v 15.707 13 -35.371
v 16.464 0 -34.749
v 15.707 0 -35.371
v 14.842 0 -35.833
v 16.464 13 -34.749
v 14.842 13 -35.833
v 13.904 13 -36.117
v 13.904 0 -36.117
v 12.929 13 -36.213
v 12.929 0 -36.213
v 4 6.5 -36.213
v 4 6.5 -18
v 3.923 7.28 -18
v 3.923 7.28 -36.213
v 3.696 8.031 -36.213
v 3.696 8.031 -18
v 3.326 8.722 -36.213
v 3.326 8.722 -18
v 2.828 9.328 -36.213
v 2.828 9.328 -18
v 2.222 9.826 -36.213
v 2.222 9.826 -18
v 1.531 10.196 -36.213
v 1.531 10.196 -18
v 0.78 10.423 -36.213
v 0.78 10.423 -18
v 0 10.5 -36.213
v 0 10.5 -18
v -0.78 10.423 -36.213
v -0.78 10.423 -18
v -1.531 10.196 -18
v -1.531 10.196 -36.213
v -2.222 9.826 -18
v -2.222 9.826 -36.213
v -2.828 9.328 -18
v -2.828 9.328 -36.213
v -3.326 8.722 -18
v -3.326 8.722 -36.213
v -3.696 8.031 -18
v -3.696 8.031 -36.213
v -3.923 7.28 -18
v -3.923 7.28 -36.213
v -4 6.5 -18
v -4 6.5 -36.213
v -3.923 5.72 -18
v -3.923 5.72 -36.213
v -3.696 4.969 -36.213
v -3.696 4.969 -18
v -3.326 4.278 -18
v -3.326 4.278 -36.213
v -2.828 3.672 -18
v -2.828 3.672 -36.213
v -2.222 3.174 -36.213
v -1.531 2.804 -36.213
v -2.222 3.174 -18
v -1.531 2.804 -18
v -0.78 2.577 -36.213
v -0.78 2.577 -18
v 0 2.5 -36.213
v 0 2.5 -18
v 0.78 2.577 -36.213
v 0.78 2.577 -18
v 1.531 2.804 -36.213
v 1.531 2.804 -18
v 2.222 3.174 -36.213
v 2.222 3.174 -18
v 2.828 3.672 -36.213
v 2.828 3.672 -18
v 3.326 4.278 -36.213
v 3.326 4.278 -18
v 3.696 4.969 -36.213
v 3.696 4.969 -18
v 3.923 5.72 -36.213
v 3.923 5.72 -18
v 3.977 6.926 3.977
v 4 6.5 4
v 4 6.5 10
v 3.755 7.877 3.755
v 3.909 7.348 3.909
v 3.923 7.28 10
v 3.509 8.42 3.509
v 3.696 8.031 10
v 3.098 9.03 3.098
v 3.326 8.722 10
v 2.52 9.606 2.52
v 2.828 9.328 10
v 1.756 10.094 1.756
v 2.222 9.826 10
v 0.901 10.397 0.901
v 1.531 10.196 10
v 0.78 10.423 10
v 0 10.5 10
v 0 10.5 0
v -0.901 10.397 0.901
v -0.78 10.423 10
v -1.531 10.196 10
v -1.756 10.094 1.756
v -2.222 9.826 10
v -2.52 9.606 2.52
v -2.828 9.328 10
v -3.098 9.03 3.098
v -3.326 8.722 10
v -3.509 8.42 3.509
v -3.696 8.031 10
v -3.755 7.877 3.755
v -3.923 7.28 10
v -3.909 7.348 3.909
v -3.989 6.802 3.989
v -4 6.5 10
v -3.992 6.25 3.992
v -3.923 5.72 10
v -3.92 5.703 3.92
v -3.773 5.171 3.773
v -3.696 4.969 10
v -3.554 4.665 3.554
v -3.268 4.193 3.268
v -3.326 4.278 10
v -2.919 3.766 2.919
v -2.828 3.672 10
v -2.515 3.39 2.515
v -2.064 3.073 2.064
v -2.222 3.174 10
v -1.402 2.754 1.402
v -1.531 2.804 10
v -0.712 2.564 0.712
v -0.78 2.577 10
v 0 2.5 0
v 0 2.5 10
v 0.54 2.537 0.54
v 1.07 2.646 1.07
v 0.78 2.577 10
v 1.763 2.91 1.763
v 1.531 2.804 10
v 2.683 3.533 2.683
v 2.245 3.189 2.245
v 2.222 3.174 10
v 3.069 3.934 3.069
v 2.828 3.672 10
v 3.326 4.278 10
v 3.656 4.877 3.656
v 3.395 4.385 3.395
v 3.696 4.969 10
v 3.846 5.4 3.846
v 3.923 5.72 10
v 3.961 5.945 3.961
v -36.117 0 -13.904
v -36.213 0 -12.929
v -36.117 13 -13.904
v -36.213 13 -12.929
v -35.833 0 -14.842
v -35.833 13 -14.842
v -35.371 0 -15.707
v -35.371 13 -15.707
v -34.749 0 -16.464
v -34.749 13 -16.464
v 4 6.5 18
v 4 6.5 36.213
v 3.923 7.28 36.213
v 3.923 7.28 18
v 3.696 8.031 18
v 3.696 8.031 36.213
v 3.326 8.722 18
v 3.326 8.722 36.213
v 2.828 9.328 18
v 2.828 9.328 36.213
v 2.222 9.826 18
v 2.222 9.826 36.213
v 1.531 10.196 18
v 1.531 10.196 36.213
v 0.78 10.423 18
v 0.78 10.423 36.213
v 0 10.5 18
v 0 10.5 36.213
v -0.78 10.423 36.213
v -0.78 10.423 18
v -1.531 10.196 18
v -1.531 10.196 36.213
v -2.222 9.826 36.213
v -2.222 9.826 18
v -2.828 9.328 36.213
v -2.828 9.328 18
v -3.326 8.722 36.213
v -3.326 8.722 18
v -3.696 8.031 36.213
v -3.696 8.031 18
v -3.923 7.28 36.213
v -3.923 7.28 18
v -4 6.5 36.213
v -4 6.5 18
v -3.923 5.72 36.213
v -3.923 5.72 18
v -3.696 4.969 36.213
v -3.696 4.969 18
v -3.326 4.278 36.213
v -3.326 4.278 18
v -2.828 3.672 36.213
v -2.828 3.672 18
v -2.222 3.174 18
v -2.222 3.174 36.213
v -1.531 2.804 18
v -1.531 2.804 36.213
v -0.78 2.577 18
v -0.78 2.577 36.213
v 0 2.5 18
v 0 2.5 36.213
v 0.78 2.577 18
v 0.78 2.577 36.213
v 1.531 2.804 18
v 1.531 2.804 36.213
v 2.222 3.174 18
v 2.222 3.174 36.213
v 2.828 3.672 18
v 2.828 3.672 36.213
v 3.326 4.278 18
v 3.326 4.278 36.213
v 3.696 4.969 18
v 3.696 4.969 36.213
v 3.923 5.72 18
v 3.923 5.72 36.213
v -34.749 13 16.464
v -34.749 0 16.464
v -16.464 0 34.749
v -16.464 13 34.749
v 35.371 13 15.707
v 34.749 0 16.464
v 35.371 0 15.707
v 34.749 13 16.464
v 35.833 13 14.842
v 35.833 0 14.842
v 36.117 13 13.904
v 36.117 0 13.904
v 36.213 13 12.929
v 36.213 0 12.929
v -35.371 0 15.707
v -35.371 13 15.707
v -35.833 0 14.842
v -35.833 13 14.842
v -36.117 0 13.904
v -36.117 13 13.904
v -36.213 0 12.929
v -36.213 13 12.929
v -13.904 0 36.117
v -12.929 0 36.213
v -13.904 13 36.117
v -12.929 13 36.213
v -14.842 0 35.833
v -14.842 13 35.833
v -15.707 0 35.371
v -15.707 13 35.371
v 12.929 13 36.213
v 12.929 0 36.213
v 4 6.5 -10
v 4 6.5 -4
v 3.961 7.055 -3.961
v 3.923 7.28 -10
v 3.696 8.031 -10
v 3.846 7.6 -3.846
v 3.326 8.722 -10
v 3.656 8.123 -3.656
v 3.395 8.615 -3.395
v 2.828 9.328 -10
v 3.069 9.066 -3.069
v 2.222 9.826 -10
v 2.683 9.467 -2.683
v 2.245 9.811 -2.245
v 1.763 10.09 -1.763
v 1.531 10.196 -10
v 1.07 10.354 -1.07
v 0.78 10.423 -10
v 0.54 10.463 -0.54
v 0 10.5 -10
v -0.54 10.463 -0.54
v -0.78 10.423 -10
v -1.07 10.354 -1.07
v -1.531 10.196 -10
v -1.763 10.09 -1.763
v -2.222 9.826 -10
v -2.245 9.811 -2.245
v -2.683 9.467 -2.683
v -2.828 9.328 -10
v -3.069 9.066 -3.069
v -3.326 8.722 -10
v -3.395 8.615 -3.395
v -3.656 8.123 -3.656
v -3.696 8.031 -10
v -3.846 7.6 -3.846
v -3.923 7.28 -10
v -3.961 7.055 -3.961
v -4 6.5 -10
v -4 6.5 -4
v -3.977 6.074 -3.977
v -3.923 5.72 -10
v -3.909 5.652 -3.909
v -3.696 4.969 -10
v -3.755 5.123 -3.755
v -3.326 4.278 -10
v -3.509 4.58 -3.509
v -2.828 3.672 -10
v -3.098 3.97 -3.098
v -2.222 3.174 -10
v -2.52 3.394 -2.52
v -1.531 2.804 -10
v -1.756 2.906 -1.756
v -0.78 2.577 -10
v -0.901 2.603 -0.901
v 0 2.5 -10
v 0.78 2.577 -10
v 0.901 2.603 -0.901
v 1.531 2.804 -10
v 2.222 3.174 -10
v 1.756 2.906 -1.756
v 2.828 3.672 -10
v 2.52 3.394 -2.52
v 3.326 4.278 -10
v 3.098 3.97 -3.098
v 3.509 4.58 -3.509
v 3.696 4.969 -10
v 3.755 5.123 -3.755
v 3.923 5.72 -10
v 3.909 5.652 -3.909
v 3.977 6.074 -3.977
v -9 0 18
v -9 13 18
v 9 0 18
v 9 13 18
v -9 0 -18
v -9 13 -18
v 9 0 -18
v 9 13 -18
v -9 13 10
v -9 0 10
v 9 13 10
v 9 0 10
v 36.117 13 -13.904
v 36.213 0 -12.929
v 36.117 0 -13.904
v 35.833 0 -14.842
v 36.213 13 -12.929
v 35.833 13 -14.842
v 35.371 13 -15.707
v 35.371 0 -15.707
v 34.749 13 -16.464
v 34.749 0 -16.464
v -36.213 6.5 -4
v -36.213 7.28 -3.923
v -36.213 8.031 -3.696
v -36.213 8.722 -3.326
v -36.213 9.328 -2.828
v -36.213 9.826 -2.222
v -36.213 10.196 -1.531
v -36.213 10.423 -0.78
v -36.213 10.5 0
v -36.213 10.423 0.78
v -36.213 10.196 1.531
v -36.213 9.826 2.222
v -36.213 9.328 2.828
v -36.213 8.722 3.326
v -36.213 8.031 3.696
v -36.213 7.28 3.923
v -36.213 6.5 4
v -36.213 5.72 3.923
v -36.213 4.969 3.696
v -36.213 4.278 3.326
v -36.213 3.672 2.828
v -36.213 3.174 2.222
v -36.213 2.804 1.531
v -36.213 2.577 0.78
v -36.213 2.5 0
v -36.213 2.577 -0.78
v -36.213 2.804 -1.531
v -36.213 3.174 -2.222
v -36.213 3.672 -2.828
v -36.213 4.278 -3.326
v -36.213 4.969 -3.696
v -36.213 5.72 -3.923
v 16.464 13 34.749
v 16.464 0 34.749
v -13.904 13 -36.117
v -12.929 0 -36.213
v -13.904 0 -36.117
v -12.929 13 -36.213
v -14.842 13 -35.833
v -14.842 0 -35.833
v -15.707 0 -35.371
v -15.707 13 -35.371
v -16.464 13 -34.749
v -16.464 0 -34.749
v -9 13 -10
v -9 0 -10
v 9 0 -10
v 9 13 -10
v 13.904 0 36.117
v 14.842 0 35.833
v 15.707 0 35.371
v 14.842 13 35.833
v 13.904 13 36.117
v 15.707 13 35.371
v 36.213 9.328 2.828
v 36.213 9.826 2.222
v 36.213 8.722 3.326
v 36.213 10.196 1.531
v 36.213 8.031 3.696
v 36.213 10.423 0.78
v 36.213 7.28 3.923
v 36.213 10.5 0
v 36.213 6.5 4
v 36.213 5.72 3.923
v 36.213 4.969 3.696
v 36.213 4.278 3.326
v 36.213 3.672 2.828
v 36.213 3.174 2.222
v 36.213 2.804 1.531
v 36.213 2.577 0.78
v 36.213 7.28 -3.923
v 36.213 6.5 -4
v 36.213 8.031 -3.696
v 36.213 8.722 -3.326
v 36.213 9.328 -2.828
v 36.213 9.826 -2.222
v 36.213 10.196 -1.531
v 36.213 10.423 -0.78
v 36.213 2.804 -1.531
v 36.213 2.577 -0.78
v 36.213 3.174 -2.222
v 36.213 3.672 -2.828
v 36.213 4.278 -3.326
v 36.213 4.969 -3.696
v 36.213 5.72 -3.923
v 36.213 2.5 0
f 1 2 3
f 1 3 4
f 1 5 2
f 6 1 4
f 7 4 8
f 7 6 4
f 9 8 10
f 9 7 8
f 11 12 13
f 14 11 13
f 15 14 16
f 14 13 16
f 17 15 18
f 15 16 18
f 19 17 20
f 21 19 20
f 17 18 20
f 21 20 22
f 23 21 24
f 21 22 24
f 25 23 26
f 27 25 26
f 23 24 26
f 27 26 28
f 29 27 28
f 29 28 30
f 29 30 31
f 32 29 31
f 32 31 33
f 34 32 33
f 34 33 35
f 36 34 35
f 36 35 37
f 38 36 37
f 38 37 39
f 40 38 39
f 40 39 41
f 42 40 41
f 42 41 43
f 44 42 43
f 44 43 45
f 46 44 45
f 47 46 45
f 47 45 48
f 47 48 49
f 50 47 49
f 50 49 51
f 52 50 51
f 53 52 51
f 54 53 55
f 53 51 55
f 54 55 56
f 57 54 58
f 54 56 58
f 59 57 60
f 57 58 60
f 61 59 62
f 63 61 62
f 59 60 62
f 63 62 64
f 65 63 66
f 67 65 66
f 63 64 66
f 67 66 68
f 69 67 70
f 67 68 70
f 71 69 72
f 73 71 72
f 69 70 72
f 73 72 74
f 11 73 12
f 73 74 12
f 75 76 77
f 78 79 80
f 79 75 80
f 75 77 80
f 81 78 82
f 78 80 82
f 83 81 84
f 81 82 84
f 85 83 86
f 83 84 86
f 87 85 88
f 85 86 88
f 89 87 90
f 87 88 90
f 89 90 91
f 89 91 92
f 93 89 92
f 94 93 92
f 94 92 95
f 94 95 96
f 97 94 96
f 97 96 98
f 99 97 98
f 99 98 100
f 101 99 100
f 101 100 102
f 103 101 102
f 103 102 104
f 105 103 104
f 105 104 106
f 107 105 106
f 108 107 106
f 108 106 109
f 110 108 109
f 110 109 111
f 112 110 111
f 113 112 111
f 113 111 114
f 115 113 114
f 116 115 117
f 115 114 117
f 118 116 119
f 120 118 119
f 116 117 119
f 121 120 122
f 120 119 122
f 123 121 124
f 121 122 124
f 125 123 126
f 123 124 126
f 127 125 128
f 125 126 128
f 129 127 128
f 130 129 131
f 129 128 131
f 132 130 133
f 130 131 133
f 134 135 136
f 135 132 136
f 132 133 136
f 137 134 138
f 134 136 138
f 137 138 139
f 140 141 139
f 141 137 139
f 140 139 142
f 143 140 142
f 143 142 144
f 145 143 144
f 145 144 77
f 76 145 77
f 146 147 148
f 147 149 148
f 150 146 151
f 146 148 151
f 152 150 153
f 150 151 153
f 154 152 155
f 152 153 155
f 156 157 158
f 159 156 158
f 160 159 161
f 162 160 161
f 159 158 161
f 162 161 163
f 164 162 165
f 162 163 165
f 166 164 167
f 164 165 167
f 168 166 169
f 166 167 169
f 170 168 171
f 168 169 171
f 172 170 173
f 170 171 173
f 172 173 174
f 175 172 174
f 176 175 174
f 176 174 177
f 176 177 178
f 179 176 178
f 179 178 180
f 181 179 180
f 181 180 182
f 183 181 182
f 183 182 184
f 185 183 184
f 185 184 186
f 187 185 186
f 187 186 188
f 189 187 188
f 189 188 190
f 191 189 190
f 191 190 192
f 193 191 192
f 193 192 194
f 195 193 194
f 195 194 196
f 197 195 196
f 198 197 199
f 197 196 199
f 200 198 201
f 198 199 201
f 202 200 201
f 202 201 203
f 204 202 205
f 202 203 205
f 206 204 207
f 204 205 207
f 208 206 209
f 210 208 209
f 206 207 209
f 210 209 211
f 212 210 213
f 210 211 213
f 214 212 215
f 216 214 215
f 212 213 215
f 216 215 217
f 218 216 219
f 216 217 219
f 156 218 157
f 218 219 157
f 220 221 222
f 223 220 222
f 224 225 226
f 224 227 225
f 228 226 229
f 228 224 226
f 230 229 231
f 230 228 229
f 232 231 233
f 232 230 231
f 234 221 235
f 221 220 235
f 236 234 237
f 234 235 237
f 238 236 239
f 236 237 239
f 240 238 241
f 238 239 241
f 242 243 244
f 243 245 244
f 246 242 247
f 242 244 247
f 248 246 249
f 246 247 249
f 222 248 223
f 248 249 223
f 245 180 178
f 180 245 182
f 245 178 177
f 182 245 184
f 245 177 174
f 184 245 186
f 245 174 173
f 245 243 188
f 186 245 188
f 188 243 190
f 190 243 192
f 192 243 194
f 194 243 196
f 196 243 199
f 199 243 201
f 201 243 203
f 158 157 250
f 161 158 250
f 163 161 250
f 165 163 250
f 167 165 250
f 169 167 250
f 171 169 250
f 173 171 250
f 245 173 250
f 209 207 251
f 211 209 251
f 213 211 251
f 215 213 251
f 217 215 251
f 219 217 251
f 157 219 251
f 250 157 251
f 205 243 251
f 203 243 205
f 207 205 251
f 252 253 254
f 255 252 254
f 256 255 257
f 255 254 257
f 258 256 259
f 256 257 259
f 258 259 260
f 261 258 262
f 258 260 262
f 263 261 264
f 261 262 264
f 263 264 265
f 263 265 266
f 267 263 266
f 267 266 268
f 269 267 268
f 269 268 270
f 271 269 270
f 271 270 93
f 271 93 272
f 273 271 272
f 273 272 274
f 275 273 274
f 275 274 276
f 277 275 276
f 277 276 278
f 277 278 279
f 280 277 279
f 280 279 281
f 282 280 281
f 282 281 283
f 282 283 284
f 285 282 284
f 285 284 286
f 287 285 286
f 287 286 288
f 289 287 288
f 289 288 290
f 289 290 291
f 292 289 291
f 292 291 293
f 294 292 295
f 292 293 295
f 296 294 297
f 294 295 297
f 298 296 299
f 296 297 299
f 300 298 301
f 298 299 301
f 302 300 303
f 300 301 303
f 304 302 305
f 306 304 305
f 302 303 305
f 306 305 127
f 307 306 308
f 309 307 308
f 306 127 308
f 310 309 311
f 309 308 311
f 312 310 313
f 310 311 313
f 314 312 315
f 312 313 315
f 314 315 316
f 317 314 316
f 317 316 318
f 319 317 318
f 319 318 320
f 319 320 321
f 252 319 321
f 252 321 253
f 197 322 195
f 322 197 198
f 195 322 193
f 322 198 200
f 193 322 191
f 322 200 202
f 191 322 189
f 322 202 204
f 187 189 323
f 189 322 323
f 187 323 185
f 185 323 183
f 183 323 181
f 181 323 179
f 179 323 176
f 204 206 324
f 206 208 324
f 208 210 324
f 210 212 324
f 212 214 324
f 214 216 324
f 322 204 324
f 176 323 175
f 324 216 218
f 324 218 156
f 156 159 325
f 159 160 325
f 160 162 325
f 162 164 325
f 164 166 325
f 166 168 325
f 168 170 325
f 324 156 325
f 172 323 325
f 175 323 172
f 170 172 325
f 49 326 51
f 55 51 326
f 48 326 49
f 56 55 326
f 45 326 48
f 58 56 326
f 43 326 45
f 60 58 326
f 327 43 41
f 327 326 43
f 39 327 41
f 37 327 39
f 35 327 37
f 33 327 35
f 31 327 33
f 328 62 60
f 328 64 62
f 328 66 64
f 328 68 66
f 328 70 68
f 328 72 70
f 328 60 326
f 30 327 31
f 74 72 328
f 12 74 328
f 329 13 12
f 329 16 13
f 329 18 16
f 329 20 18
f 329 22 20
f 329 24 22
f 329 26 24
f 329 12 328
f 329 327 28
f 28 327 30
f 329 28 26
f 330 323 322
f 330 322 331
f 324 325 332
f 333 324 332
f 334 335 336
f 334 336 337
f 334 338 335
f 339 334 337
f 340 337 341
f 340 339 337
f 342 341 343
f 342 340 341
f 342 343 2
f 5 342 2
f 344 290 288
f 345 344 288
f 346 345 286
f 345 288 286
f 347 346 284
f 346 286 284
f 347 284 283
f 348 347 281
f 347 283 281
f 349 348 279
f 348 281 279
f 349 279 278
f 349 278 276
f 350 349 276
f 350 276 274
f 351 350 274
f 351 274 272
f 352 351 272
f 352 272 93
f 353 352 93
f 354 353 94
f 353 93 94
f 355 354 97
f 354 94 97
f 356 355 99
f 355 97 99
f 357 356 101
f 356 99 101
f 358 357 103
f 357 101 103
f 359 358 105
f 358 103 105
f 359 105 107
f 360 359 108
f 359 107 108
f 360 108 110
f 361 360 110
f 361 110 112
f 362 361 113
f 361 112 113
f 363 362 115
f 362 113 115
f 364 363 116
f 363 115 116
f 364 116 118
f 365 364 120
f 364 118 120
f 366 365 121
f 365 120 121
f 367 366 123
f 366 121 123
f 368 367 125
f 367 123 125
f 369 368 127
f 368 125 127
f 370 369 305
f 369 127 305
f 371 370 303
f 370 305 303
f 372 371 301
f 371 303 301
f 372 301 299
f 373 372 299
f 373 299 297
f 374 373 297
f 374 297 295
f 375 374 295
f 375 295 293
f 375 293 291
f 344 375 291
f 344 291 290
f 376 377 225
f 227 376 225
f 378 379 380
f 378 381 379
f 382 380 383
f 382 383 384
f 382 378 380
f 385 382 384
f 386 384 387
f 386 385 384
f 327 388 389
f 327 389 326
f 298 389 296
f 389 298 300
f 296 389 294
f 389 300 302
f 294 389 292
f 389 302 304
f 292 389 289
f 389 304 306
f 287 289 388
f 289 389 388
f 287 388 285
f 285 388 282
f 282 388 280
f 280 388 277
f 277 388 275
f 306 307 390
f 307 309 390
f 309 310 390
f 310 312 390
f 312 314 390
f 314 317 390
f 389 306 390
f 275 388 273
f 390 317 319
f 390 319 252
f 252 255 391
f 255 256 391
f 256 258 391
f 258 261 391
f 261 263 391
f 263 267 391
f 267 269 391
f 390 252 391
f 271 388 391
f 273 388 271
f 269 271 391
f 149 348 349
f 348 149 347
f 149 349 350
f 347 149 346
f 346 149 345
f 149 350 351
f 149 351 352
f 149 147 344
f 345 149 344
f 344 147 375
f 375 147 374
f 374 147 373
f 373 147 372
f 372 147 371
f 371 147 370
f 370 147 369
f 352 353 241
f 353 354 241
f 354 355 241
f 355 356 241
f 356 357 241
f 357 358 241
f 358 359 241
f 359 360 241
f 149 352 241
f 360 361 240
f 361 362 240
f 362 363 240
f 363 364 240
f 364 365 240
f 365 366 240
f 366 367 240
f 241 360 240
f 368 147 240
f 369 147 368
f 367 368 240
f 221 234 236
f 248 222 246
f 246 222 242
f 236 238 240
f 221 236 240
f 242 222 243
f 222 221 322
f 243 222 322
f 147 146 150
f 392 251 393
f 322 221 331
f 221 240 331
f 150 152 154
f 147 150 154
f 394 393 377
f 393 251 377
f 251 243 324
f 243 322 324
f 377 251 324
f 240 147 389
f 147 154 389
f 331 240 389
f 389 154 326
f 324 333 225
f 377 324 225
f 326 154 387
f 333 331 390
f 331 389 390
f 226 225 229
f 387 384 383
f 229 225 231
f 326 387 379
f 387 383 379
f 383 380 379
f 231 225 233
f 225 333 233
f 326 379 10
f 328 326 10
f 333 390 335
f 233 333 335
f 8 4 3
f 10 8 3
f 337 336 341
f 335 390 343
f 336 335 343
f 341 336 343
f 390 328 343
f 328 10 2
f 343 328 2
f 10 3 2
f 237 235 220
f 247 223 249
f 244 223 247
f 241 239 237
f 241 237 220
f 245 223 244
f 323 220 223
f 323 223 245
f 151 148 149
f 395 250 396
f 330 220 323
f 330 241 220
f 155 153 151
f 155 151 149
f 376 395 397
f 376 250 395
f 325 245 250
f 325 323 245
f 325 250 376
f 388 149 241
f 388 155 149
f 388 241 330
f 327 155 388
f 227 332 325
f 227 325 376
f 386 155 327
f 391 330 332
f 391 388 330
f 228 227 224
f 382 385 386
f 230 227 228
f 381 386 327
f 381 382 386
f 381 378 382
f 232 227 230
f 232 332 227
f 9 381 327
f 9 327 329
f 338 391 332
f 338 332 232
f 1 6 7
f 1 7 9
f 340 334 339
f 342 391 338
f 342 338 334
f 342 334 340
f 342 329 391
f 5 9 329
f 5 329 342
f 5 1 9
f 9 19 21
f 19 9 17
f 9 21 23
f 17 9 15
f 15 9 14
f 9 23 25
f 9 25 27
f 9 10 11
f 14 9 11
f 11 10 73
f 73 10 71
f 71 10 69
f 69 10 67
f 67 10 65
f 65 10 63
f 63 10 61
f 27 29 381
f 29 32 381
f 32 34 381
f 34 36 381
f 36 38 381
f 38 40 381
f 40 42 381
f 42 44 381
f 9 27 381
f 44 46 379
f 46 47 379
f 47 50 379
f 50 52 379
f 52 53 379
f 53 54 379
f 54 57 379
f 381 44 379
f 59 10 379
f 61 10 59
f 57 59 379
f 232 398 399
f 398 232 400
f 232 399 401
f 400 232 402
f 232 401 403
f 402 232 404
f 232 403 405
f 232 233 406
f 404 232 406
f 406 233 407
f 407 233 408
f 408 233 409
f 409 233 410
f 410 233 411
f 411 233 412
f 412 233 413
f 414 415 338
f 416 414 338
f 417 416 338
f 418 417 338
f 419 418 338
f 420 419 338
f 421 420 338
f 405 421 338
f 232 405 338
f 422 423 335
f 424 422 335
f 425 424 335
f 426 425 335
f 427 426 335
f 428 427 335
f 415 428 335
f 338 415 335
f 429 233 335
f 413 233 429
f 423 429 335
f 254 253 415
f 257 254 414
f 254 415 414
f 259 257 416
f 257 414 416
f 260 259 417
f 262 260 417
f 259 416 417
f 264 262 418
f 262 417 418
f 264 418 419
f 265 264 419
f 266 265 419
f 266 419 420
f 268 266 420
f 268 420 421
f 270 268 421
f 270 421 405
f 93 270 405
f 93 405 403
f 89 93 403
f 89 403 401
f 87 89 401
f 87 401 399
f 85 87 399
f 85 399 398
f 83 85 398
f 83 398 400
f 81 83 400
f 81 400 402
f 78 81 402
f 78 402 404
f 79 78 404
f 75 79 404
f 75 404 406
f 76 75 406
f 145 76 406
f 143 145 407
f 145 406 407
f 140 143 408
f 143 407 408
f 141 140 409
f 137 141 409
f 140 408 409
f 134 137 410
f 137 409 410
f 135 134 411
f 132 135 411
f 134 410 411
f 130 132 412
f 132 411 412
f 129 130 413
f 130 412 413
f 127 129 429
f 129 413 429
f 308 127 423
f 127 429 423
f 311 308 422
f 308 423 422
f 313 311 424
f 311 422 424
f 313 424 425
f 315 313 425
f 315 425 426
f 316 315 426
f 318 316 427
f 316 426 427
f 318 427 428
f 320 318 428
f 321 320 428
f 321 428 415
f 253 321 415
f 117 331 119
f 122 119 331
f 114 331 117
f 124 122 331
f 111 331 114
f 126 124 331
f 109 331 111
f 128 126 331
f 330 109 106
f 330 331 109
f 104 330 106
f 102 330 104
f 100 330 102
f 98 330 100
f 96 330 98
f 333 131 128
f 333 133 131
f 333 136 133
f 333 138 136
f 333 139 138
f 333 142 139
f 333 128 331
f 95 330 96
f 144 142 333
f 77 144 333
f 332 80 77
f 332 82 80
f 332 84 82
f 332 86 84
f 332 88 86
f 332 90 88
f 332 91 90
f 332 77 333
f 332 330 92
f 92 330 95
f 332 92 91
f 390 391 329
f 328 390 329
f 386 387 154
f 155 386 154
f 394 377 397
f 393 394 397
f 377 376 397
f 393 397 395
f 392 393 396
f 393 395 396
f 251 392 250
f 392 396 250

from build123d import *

# Parameters (mm, degrees)
EXTRUDE2_DEPTH = 13
EXTRUDE3_REACH = 74.426
SKETCH2_R      = 4
SKETCH3_R      = 4
EXTRUDE4_DEPTH = 73.426406871
SKETCH4_W      = 18
SKETCH4_H      = 8
EXTRUDE5_DEPTH = 13
FILLET1_R      = 5


with BuildPart() as part:
    # Sketch1 → Extrude2 (new body)
    with BuildSketch(Plane(origin=(0, 0, 0), x_dir=(1, 0, 0), z_dir=(0, 1, 0))):
        Polygon((15, -36.213203436), (36.213203436, -15), (36.213203436, 15), (15, 36.213203436), (-15, 36.213203436), (-36.213203436, 15), (-36.213203436, -15), (-15, -36.213203436), align=None)
    extrude(amount=EXTRUDE2_DEPTH)

    # Sketch2 → Extrude3 (cut, up to next)
    with BuildSketch(Plane(origin=(36.213203436, 0, 0), x_dir=(0, 0, -1), z_dir=(1, 0, 0)), mode=Mode.PRIVATE) as extrude3_sk1:
        with Locations((0, 6.5)):
            Circle(SKETCH2_R)
    extrude3_tool1 = extrude(extrude3_sk1.sketch, amount=-EXTRUDE3_REACH, mode=Mode.PRIVATE) & part.part
    add(extrude3_tool1.solids().sort_by_distance((36.213203, 6.5, 0))[0], mode=Mode.SUBTRACT)

    # Sketch3 → Extrude4 (cut, through all)
    with BuildSketch(Plane.XY.offset(36.213203436)):
        with Locations((0, 6.5)):
            Circle(SKETCH3_R)
    extrude(amount=-EXTRUDE4_DEPTH, mode=Mode.SUBTRACT)

    # Sketch4 → Extrude5 (cut)
    with BuildSketch(Plane(origin=(0, 13, 0), x_dir=(1, 0, 0), z_dir=(0, 1, 0))):
        with Locations((0, -14)):
            Rectangle(SKETCH4_W, SKETCH4_H)
        with Locations((0, 14)):
            Rectangle(SKETCH4_W, SKETCH4_H)
    extrude(amount=-EXTRUDE5_DEPTH, mode=Mode.SUBTRACT)

    # Fillet1
    fillet1_edges = [part.edges().sort_by_distance(p)[0] for p in [
        (36.213203436, 6.5, 15),
        (15, 6.5, 36.213203436),
        (-15, 6.5, 36.213203436),
        (-36.213203436, 6.5, 15),
        (-36.213203436, 6.5, -15),
        (-15, 6.5, -36.213203436),
        (15, 6.5, -36.213203436),
        (36.213203436, 6.5, -15),
    ]]
    fillet(fillet1_edges, radius=FILLET1_R)


solid = part.part
